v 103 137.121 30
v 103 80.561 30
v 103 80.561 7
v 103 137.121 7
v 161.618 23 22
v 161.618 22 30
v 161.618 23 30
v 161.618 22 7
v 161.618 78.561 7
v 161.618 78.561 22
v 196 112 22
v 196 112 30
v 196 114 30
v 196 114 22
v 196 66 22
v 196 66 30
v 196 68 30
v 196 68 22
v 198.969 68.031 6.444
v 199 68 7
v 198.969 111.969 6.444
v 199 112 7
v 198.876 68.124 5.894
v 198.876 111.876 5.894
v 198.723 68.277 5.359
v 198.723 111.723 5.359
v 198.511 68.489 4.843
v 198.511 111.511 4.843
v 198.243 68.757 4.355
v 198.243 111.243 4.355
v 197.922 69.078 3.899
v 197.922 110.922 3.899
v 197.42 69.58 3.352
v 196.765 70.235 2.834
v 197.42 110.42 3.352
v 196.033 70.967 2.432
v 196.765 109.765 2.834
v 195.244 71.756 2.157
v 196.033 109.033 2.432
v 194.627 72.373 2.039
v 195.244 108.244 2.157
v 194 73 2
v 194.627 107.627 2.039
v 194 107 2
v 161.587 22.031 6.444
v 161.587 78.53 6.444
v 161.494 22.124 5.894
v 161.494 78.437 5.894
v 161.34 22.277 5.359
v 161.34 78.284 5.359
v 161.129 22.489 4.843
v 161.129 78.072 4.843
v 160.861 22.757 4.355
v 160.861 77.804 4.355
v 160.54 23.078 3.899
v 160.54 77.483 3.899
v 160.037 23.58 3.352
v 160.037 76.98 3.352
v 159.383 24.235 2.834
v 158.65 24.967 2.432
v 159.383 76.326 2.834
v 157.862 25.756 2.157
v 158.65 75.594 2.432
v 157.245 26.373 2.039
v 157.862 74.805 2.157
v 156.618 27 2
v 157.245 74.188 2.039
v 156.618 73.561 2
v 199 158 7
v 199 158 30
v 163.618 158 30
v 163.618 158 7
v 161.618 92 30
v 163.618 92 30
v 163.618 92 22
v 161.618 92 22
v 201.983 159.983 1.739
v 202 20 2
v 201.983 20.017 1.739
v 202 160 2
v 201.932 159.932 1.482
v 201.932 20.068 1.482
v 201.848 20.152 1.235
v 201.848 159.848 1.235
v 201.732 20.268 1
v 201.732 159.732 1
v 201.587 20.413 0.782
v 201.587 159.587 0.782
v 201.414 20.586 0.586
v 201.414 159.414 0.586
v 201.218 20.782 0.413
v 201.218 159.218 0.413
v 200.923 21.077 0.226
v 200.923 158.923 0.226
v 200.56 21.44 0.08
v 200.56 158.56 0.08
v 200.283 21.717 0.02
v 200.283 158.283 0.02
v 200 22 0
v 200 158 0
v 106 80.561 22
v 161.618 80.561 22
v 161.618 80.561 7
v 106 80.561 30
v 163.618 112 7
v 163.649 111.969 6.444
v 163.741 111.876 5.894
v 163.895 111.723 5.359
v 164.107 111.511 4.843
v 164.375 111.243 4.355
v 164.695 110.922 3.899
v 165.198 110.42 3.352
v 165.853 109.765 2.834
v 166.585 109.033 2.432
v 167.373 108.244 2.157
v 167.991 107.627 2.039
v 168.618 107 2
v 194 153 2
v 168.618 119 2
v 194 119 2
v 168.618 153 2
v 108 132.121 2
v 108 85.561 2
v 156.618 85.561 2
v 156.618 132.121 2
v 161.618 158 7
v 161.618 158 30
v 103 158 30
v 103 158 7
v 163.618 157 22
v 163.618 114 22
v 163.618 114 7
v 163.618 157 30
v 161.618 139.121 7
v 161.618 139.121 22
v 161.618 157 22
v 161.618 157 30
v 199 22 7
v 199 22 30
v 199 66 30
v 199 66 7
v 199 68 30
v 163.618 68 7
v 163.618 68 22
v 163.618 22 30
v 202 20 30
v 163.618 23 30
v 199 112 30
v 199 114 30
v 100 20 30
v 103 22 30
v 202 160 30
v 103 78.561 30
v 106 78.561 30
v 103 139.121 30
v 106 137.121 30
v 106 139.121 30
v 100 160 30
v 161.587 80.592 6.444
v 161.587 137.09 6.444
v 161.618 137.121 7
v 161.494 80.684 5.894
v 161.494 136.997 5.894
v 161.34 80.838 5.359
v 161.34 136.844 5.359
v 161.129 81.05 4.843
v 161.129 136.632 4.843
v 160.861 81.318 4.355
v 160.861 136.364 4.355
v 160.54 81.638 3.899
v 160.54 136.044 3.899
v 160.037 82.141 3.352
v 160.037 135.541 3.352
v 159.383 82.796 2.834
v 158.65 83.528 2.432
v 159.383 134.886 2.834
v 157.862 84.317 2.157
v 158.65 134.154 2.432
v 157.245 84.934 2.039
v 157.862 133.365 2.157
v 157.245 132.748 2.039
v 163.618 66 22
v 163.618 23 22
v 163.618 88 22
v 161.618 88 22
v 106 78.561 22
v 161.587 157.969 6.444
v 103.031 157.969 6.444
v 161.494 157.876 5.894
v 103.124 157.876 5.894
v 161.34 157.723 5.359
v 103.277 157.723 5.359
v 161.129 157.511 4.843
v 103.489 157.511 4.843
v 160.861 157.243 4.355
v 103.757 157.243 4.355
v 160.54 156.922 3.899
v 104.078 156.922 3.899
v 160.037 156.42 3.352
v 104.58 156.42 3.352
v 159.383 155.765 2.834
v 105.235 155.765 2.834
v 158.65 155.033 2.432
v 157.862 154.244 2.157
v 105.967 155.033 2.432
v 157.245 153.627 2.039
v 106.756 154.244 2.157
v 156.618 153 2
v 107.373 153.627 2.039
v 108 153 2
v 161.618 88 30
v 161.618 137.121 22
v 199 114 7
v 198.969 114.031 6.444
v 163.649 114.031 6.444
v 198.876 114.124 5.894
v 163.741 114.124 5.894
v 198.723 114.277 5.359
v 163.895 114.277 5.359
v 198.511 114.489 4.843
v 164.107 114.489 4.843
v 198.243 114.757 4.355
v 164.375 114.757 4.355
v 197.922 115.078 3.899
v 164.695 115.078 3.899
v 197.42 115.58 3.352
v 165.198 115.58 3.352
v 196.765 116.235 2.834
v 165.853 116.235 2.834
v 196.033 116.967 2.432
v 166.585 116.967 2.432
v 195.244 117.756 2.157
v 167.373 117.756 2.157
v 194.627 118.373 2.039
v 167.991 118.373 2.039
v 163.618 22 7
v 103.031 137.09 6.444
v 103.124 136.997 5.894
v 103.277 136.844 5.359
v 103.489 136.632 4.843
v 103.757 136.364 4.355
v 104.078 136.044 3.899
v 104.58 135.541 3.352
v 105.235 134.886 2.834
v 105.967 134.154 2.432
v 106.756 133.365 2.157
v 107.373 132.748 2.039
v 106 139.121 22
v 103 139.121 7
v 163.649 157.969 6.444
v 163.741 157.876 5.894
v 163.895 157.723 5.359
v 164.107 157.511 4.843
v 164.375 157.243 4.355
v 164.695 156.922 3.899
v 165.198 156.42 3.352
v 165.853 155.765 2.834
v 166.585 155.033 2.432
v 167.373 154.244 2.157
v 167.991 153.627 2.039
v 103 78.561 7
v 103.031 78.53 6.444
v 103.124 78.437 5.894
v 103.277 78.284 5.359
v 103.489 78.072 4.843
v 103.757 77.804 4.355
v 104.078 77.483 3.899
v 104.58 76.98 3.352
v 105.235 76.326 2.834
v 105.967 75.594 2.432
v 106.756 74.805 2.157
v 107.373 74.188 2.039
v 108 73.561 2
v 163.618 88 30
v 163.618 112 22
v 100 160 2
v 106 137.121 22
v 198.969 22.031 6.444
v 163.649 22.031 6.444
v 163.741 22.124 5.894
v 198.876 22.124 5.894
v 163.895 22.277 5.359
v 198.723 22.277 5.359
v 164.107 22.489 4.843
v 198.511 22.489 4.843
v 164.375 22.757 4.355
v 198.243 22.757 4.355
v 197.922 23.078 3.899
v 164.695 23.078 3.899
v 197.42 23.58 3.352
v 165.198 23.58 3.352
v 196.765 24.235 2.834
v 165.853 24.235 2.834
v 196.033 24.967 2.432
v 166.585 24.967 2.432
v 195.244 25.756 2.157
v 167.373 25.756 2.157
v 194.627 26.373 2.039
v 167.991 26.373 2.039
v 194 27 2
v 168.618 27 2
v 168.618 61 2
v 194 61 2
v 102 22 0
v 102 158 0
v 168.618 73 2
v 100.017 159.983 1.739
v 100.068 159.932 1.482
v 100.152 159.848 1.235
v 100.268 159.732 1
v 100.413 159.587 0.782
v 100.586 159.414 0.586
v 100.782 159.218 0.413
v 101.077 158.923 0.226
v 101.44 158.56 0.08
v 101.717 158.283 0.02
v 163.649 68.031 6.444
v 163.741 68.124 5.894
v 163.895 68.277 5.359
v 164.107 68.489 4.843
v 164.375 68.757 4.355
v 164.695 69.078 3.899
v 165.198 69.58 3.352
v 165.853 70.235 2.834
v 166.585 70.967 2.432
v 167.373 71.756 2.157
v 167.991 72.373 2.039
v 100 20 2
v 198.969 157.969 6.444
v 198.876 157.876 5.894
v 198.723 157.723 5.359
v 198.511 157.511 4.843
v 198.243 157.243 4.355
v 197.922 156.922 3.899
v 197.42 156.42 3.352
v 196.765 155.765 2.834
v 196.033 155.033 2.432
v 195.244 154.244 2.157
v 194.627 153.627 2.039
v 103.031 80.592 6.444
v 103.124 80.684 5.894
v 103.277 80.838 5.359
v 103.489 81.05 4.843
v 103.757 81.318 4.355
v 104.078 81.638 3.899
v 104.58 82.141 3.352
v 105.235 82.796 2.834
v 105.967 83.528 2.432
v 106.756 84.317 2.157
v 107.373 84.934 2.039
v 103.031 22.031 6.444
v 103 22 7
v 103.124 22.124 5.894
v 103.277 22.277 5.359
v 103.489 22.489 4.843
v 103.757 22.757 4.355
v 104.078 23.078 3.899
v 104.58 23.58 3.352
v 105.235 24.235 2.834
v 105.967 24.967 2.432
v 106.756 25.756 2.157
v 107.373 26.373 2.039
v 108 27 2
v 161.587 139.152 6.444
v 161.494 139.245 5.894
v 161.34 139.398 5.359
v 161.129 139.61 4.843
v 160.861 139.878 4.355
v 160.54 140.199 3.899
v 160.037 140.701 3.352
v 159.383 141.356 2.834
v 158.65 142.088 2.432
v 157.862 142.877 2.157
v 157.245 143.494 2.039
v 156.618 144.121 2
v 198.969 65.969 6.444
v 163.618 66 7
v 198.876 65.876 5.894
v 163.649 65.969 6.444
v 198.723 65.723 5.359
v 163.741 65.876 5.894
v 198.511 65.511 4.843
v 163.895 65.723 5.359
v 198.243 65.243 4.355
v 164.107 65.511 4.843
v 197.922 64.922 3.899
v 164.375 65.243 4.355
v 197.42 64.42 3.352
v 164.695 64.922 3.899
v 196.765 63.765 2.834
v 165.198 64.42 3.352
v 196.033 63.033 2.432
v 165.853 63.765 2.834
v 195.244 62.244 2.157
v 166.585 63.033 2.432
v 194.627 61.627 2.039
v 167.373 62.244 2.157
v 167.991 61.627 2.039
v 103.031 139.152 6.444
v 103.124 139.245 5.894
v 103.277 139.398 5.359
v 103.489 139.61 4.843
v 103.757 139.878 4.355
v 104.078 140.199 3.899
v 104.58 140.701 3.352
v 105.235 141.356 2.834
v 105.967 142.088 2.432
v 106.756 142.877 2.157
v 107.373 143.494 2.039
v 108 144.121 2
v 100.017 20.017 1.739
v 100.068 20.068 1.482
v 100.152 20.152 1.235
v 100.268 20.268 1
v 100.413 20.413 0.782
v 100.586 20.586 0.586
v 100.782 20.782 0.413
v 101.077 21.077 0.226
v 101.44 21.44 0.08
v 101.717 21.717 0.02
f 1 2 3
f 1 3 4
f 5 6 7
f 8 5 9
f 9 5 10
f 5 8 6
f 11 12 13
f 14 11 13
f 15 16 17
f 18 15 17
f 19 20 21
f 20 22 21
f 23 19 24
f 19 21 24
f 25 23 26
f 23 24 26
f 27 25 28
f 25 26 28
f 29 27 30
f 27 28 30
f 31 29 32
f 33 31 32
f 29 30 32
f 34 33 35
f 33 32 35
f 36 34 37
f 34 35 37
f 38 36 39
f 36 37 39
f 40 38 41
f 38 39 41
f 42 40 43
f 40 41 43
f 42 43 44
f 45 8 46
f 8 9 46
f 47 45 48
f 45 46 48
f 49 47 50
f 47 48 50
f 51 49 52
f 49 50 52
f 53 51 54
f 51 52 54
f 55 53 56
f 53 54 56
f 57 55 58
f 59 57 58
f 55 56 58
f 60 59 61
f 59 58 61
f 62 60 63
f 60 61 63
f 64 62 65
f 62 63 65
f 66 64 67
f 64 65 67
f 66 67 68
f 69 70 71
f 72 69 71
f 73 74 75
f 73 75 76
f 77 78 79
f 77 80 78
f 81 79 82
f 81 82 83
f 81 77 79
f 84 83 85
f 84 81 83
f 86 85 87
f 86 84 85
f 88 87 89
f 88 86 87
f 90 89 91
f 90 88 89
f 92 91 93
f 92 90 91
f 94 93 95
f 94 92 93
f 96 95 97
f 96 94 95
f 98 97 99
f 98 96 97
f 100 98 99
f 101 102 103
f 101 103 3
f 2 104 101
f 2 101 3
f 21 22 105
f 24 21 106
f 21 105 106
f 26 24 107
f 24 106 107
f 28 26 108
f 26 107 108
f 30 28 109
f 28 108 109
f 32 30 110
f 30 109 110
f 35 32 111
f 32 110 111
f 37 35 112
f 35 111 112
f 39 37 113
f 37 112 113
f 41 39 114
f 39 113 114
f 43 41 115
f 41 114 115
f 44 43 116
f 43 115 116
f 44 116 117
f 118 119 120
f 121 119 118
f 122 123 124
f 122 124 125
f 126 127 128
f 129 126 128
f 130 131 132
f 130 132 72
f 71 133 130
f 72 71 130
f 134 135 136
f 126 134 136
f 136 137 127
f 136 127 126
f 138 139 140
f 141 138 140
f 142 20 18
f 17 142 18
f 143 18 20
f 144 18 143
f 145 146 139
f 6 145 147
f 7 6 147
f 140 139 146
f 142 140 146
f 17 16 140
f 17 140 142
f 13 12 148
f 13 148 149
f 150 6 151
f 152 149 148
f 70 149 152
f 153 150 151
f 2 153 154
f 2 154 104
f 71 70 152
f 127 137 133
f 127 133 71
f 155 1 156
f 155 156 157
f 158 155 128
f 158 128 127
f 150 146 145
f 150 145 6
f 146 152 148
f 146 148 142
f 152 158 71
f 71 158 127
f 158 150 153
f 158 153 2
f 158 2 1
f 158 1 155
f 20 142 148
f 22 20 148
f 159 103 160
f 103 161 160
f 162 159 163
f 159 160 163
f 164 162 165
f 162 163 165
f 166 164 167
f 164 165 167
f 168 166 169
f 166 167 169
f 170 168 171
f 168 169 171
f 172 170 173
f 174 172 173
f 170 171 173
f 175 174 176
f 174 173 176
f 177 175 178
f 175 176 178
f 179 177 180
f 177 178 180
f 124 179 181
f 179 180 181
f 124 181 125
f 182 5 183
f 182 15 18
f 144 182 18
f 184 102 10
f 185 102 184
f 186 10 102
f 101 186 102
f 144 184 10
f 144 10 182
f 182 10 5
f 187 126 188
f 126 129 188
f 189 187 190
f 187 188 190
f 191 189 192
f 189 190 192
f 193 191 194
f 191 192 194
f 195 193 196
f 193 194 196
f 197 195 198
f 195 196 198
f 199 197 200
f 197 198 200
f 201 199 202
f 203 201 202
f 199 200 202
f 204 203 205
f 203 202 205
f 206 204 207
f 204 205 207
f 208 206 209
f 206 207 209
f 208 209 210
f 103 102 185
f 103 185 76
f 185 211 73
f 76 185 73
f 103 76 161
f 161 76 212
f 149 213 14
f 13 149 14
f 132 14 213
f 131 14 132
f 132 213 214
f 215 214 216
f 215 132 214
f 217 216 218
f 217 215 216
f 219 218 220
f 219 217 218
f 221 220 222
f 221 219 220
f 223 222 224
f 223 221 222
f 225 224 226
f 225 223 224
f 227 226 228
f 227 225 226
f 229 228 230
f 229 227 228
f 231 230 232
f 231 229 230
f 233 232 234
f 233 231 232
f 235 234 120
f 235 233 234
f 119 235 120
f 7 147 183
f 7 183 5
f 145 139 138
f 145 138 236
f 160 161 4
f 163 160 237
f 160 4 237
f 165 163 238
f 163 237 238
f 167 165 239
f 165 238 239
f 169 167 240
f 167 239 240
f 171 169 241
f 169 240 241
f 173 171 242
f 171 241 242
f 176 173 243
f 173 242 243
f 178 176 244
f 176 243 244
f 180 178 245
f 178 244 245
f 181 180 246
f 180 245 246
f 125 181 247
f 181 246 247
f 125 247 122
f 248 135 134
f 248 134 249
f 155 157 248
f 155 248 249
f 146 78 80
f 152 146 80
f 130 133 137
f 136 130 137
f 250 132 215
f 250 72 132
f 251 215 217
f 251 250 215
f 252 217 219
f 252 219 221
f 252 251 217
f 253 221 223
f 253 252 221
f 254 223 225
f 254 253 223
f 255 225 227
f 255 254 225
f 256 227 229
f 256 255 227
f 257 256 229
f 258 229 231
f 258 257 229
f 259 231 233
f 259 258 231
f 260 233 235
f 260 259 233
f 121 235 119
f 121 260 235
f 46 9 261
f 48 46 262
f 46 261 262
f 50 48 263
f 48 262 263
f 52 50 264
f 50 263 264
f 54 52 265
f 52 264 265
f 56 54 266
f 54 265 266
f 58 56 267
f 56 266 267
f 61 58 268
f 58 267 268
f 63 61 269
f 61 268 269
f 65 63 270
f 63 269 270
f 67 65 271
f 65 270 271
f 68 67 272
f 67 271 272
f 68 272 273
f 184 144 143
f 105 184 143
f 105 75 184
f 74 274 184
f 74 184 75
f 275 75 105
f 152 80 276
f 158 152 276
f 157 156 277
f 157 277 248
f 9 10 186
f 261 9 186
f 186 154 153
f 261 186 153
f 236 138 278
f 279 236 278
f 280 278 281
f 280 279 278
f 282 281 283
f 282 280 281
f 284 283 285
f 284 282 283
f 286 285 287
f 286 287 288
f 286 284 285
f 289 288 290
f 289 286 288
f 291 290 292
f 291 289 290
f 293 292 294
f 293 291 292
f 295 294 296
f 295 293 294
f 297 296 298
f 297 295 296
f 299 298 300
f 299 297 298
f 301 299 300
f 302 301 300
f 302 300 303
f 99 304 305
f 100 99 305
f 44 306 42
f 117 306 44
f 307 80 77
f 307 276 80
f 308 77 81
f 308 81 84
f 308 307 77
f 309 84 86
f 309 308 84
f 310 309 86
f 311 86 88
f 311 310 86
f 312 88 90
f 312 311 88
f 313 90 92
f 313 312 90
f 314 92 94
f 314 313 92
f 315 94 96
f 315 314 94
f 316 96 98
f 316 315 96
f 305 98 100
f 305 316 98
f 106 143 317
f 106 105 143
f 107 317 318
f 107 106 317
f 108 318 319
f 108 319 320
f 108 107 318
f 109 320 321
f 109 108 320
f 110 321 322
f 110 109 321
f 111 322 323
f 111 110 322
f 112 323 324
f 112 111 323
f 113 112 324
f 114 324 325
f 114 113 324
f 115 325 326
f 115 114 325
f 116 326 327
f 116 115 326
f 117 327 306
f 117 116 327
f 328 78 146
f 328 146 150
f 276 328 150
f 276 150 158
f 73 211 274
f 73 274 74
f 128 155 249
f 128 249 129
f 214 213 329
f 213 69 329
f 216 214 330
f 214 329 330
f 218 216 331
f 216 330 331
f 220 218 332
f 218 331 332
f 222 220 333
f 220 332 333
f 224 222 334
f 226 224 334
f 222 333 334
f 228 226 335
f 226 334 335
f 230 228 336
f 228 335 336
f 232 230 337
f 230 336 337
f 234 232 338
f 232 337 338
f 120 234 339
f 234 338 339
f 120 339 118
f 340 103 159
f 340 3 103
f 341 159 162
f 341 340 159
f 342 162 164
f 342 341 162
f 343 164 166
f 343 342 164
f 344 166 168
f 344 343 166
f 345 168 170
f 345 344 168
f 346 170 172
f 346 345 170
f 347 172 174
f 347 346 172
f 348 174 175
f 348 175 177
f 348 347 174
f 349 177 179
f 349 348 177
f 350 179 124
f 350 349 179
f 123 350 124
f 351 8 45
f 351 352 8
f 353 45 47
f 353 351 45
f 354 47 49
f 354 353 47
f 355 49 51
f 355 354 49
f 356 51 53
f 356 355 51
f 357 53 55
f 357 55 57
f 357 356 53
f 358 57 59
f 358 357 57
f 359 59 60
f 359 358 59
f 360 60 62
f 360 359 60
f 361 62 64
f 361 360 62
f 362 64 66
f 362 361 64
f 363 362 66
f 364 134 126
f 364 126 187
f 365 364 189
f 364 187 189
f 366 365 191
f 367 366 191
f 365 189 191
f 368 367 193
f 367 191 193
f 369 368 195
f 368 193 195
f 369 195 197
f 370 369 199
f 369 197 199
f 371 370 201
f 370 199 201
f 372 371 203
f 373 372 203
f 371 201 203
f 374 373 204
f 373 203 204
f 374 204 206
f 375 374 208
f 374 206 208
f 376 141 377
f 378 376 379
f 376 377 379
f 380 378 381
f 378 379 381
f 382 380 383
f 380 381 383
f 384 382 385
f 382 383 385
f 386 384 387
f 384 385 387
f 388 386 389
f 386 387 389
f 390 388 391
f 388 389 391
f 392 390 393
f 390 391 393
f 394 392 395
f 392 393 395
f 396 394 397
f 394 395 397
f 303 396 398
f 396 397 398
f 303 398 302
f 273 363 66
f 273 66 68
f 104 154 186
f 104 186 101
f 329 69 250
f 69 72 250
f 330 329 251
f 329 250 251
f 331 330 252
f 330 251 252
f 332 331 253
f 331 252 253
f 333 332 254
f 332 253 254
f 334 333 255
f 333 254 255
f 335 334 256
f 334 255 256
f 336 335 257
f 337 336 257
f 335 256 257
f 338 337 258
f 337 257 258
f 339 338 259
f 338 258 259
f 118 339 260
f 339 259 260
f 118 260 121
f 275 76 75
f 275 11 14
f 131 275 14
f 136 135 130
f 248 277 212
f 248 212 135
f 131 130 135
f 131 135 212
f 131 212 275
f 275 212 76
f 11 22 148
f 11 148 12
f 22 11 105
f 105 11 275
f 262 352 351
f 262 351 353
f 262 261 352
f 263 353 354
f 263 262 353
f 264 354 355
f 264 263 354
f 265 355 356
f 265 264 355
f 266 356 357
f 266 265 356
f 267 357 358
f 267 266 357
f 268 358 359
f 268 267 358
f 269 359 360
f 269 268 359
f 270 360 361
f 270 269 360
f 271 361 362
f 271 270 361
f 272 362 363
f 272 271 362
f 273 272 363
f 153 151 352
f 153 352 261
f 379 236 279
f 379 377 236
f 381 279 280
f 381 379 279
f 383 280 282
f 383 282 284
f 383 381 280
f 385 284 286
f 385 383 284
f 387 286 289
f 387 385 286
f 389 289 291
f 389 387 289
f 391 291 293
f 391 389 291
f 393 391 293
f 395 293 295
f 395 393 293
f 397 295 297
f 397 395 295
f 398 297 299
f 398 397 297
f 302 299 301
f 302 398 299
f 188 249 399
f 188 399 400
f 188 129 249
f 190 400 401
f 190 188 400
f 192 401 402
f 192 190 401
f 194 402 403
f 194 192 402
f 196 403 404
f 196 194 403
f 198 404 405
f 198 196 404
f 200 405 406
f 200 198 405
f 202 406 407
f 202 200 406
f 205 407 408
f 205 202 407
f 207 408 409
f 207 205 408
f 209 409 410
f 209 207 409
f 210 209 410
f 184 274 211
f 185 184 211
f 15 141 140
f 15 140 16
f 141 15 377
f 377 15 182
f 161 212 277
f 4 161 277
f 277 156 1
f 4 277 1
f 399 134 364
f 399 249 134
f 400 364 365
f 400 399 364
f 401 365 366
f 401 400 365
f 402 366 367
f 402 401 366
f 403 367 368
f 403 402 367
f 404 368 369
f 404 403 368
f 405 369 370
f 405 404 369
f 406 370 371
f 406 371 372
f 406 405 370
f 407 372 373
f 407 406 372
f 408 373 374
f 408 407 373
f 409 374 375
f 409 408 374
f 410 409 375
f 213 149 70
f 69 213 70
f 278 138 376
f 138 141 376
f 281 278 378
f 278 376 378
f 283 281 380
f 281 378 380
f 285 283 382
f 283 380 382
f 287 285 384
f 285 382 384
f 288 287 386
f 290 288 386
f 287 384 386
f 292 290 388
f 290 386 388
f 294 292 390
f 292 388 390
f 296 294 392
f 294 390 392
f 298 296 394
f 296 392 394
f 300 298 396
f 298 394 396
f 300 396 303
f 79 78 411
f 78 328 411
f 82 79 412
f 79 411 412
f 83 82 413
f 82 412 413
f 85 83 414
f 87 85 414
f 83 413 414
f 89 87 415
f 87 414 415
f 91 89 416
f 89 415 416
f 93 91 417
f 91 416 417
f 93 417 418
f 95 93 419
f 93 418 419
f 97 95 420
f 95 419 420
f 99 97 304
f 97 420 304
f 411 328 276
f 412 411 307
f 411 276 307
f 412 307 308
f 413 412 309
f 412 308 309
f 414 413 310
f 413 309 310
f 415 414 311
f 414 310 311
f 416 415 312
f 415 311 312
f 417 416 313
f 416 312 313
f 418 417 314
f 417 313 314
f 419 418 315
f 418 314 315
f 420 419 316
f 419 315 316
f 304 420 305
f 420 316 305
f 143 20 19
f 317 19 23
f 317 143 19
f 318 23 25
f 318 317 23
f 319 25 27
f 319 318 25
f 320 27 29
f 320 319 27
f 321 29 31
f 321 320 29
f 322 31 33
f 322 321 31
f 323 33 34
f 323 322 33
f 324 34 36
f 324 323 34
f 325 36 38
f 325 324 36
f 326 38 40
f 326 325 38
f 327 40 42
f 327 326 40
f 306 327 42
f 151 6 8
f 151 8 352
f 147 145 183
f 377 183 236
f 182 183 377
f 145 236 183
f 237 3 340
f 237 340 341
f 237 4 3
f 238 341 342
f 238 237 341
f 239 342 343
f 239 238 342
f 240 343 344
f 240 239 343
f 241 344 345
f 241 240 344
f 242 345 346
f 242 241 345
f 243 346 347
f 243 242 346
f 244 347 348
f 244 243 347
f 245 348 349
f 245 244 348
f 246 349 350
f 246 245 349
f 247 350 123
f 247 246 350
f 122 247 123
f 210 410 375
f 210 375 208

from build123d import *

# Parameters (mm, degrees)
SKETCH_W             = 140
SKETCH_H             = 102
PAD_DEPTH            = 30
SKETCH001_W          = 56.560638
SKETCH001_H          = 58.617586
SKETCH001_W_2        = 18.878723
SKETCH001_W_3        = 44
SKETCH001_H_2        = 35.382414
POCKET_DEPTH         = 28
FILLET_R             = 5
SKETCH002_W          = 65
SKETCH002_H          = 90
POCKET001_DEPTH      = 8
FILLET001_R          = 2
BODY_PLACEMENT_ANGLE = 90


with BuildPart() as part:
    # Sketch → Pad (new body)
    with BuildSketch(Plane.XY):
        Rectangle(SKETCH_W, SKETCH_H)
    extrude(amount=PAD_DEPTH)

    # Sketch001 (on DatumPlane) → Pocket (cut)
    with BuildSketch(Plane.XY.offset(30)):
        with Locations((-39.719681, 18.691207)):
            Rectangle(SKETCH001_W, SKETCH001_H)
        with Locations((18.840958, 18.691207)):
            Rectangle(SKETCH001_W, SKETCH001_H)
        with Locations((58.560638, 18.691207)):
            Rectangle(SKETCH001_W_2, SKETCH001_H)
        with Locations((-46, -30.308793)):
            Rectangle(SKETCH001_W_3, SKETCH001_H_2)
        with Locations((0, -30.308793)):
            Rectangle(SKETCH001_W_3, SKETCH001_H_2)
        with Locations((46, -30.308793)):
            Rectangle(SKETCH001_W_3, SKETCH001_H_2)
    extrude(amount=-POCKET_DEPTH, mode=Mode.SUBTRACT)

    # Fillet
    fillet_edges = [part.edges().sort_by_distance(p)[0] for p in [
        (-46, -12.617586, 2),
        (-24, -30.308793, 2),
        (-46, -48, 2),
        (-68, -30.308793, 2),
        (-39.719681, 48, 2),
        (-11.439362, 18.691207, 2),
        (-39.719681, -10.617586, 2),
        (-68, 18.691207, 2),
        (18.840958, 48, 2),
        (47.121277, 18.691207, 2),
        (18.840958, -10.617586, 2),
        (-9.439361, 18.691207, 2),
        (0, -12.617586, 2),
        (22, -30.308793, 2),
        (0, -48, 2),
        (-22, -30.308793, 2),
        (46, -12.617586, 2),
        (68, -30.308793, 2),
        (46, -48, 2),
        (24, -30.308793, 2),
        (58.560638, 48, 2),
        (68, 18.691207, 2),
        (58.560638, -10.617586, 2),
        (49.121277, 18.691207, 2),
    ]]
    fillet(fillet_edges, radius=FILLET_R)

    # Sketch002 (on DatumPlane) → Pocket001 (cut)
    with BuildSketch(Plane.XY.offset(30)):
        with Locations((-34.5, 0)):
            Rectangle(SKETCH002_W, SKETCH002_H)
        with Locations((34.5, 0)):
            Rectangle(SKETCH002_W, SKETCH002_H)
    extrude(amount=-POCKET001_DEPTH, mode=Mode.SUBTRACT)

    # Fillet001
    fillet001_edges = [part.edges().sort_by_distance(p)[0] for p in [
        (0, 51, 0),
        (70, 0, 0),
        (0, -51, 0),
        (-70, 0, 0),
    ]]
    fillet(fillet001_edges, radius=FILLET001_R)


with BuildPart() as part_1:
    # Body placement: moved
    add(part.part.moved(Location((151, 90, 0))).rotate(Axis((151, 90, 0), (0, 0, 1)), BODY_PLACEMENT_ANGLE))


solid = part_1.part
